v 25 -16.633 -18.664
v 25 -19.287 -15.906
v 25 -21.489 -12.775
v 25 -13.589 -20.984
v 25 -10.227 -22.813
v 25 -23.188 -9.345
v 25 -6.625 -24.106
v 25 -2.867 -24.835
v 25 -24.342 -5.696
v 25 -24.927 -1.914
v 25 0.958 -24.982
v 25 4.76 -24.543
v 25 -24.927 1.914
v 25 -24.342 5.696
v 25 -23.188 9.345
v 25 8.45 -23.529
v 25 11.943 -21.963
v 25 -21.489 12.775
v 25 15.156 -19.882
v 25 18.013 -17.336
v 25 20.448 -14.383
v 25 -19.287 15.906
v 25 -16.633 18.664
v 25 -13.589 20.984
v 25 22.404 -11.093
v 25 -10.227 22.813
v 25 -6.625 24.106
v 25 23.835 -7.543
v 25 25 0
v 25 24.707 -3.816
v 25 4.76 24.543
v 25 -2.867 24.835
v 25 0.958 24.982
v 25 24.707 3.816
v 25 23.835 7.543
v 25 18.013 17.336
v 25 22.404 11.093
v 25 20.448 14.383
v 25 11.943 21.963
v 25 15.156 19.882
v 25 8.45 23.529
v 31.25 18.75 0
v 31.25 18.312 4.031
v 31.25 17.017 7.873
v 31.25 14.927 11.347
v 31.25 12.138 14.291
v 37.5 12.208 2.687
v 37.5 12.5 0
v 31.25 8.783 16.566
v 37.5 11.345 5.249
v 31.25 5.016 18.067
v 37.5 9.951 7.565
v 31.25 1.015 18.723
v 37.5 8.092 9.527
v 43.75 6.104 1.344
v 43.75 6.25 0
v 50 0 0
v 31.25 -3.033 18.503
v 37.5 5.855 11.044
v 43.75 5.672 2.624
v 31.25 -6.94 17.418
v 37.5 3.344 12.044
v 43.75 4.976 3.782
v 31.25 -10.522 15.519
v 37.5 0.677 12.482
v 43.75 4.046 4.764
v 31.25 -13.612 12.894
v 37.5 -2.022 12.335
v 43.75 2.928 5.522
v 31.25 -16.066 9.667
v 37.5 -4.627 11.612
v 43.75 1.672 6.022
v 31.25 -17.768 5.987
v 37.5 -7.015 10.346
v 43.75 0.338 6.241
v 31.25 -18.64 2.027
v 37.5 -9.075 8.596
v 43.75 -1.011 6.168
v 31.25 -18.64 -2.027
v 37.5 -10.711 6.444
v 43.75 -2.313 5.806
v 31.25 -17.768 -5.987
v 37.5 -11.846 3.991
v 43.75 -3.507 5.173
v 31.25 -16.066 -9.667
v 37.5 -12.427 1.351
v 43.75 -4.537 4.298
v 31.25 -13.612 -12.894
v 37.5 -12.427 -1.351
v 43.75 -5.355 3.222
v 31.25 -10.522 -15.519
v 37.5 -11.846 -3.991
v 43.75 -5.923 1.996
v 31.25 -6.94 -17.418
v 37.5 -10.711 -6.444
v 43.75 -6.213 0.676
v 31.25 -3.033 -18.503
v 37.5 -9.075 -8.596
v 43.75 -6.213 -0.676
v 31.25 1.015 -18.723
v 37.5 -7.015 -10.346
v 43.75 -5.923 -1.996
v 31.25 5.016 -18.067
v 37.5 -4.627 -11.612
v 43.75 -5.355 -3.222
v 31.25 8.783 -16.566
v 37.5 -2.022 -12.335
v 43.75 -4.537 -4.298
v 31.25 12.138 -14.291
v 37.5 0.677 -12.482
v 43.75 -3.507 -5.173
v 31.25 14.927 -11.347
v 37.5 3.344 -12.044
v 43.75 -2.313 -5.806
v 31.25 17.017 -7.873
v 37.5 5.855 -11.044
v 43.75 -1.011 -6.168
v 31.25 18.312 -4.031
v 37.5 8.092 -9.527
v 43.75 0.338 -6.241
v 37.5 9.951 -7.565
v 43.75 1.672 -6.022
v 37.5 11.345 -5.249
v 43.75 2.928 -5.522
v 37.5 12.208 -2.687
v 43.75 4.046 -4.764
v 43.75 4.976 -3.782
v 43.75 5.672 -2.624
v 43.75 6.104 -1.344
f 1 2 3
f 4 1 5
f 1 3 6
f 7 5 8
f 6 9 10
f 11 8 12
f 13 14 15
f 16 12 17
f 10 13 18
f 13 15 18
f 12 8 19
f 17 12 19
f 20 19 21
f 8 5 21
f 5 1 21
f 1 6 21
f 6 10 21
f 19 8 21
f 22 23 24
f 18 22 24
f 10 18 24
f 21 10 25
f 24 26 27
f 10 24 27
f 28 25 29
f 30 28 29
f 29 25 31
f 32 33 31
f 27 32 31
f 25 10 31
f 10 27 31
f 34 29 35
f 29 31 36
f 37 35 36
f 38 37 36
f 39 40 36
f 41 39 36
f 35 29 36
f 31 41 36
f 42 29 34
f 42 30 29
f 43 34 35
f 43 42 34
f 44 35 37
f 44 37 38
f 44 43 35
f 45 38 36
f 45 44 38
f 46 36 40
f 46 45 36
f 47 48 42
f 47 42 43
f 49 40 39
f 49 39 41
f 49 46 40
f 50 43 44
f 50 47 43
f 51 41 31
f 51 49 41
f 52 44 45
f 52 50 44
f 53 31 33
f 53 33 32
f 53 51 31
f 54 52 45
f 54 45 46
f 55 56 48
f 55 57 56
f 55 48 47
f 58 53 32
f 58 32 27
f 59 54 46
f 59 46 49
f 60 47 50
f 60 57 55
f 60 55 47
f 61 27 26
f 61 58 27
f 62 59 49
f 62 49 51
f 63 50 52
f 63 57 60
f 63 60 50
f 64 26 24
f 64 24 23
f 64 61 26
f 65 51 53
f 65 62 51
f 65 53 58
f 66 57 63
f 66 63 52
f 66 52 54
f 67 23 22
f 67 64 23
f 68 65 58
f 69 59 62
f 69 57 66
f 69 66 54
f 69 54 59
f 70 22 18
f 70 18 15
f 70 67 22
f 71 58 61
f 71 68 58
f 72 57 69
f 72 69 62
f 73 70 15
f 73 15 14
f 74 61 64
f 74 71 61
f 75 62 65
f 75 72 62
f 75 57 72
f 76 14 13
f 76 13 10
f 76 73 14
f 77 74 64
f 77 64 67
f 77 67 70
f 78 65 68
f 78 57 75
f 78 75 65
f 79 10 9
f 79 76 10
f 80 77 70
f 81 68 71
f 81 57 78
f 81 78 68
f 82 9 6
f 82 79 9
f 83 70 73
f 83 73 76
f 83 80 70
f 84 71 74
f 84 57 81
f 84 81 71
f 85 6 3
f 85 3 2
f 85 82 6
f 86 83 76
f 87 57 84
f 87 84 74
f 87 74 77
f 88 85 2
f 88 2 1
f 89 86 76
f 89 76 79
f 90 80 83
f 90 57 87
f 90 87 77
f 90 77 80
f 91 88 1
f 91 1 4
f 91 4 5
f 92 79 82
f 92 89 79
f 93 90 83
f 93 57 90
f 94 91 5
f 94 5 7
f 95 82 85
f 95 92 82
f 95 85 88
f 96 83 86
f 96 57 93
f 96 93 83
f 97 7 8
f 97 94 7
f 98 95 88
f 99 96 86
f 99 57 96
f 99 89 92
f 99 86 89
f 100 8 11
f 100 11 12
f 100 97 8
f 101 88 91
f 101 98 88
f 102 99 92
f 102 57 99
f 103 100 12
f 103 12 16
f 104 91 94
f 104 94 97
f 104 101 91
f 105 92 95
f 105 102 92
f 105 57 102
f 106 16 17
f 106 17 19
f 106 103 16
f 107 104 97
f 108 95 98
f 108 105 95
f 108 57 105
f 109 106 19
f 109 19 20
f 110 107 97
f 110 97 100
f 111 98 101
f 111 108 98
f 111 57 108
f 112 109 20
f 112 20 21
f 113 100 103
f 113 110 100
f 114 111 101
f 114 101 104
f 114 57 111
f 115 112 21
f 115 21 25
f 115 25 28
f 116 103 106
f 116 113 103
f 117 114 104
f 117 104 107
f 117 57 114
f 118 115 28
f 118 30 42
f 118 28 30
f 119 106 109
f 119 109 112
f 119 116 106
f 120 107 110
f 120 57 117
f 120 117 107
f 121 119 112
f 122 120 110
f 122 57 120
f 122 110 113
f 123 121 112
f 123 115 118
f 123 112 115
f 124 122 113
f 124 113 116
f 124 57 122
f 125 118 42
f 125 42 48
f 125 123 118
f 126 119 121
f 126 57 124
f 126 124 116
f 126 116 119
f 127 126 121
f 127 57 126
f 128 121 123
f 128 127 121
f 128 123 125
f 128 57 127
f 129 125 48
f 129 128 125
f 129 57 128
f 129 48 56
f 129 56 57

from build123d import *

# Parameters (mm, degrees)
SKETCH001_W = 142.252221
SKETCH001_H = 119.938137
PAD_DEPTH   = 25


with BuildPart() as pad:
    # Sketch001 → Pad (new body)
    with BuildSketch(Plane.YZ):
        with Locations((-0.633922, -1.648195)):
            Rectangle(SKETCH001_W, SKETCH001_H)
    extrude(amount=PAD_DEPTH)


with BuildPart() as cut:
    # Sketch → Revolution (revolve)
    with BuildSketch(Plane.XY):
        Polygon((0, 0), (0, 50), (50, 0), align=None)
    revolve(axis=Axis((0, 0, 0), (1, 0, 0)))

    # Cut: cut Pad
    add(pad.part, mode=Mode.SUBTRACT)


solid = cut.part
